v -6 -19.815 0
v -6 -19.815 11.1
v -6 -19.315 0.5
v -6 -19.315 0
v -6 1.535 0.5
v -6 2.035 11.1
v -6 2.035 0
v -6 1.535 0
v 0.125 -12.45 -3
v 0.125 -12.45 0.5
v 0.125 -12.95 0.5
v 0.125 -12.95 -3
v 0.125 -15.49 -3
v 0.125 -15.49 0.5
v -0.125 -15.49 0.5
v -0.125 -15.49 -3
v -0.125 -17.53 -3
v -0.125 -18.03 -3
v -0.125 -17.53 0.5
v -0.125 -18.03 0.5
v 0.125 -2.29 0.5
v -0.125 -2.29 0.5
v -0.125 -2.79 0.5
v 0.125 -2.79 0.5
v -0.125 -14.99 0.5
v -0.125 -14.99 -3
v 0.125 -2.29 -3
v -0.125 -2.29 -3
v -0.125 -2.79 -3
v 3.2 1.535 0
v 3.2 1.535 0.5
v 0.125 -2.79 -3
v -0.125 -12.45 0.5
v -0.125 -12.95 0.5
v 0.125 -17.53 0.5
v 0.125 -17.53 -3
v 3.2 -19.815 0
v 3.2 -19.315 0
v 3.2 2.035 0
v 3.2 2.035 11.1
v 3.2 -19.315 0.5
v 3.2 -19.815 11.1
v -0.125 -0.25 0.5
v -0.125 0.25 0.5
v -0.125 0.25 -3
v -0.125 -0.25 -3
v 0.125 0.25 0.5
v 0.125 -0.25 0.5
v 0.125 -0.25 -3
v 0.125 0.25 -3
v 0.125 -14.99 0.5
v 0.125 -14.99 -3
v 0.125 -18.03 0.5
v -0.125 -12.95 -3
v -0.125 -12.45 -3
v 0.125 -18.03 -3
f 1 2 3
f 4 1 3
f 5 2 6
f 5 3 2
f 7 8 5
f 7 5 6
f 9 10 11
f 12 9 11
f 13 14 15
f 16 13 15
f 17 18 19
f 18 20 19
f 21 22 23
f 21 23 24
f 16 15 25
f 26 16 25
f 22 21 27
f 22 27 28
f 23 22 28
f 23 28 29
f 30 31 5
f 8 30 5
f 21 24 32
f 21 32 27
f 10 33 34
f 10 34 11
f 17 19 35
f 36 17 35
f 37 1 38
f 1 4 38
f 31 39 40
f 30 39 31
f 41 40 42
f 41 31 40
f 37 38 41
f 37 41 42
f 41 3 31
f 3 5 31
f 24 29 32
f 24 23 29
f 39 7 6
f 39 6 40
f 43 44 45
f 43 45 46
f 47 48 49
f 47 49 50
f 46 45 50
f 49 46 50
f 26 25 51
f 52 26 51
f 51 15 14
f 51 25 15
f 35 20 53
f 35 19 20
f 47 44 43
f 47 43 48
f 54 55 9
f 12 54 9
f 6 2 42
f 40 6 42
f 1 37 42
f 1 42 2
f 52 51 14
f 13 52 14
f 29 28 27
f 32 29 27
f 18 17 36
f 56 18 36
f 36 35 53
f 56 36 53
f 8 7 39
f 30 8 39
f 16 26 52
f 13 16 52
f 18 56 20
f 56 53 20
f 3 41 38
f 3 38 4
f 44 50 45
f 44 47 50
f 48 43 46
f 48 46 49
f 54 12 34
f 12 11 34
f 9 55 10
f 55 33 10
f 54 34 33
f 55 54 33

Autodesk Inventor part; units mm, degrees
ref_plane "YZ Plane" through (0, 0, 0) normal (1, 0, 0) x (0, 1, 0)
ref_plane "XZ Plane" through (0, 0, 0) normal (0, 1, 0) x (-1, 0, 0)
ref_plane "XY Plane" through (0, 0, 0) normal (0, 0, 1) x (1, 0, 0)
sketch "Sketch2" plane through (0, 0, 0) normal (0, 0, 1) x (1, 0, 0)
  line L0 (-6, 2.035) -> (3.2, 2.035)
  line L1 (3.2, 2.035) -> (3.2, -19.815)
  line L2 (3.2, -19.815) -> (-6, -19.815)
  line L3 (-6, -19.815) -> (-6, 2.035)
  line L4 (-0.125, -0.25) -> (0.125, -0.25)
  line L5 (0.125, -0.25) -> (0.125, 0.25)
  line L6 (0.125, 0.25) -> (-0.125, 0.25)
  line L7 (-0.125, 0.25) -> (-0.125, -0.25)
  line L8 (-0.125, -0.25) -> (0.125, 0.25) construction
  line L9 (0.125, -0.25) -> (-0.125, 0.25) construction
  line L10 (-0.125, -2.79) -> (0.125, -2.79)
  line L11 (0.125, -2.79) -> (0.125, -2.29)
  line L12 (0.125, -2.29) -> (-0.125, -2.29)
  line L13 (-0.125, -2.29) -> (-0.125, -2.79)
  line L14 (-0.125, -2.79) -> (0.125, -2.29) construction
  line L15 (0.125, -2.79) -> (-0.125, -2.29) construction
  line L16 (-0.125, -12.45) -> (0.125, -12.45)
  line L17 (0.125, -12.45) -> (0.125, -12.95)
  line L18 (0.125, -12.95) -> (-0.125, -12.95)
  line L19 (-0.125, -12.95) -> (-0.125, -12.45)
  line L20 (-0.125, -12.45) -> (0.125, -12.95) construction
  line L21 (0.125, -12.45) -> (-0.125, -12.95) construction
  line L22 (-0.125, -14.99) -> (0.125, -14.99)
  line L23 (0.125, -14.99) -> (0.125, -15.49)
  line L24 (-0.125, -15.49) -> (-0.125, -14.99)
  line L25 (-0.125, -14.99) -> (0.125, -15.49) construction
  line L26 (0.125, -14.99) -> (-0.125, -15.49) construction
  line L27 (0.125, -15.49) -> (-0.125, -15.49)
  line L28 (-0.125, -17.53) -> (0.125, -17.53)
  line L29 (0.125, -17.53) -> (0.125, -18.03)
  line L30 (-0.125, -18.03) -> (-0.125, -17.53)
  line L31 (-0.125, -17.53) -> (0.125, -18.03) construction
  line L32 (0.125, -17.53) -> (-0.125, -18.03) construction
  line L33 (0.125, -18.03) -> (-0.125, -18.03)
  line L34 (-6, 2.035) -> (3.2, 2.035)
  line L35 (3.2, 2.035) -> (3.2, 1.535)
  line L36 (3.2, 1.535) -> (-6, 1.535)
  line L37 (-6, 1.535) -> (-6, 2.035)
  line L38 (-6, -19.815) -> (3.2, -19.815)
  line L39 (3.2, -19.815) -> (3.2, -19.315)
  line L40 (3.2, -19.315) -> (-6, -19.315)
  line L41 (-6, -19.315) -> (-6, -19.815)
  point P0 (0, 0)
  point P1 (0, -2.54)
  point P2 (0, -12.7)
  point P3 (0, -15.24)
  point P4 (0, -17.78)
  dimension "d37" = 2.035
  dimension "d38" = 3.2
  dimension "d40" = 9.2
  dimension "d41" = 0.25
  dimension "d42" = 0.5
  dimension "d45" = 2.54
  dimension "d50" = 0.25
  dimension "d51" = 0.5
  dimension "d52" = 0
  dimension "d53" = 12.7
  dimension "d56" = 2.54
  dimension "d61" = 0.5
  dimension "d62" = 0.5
  dimension "d72" = 21.85
extrude "Extrusion4" add sketch "Sketch2" along normal blind 10.6 contours L0 L1 L36 L3 | L36 L1 L40 L3 | L40 L1 L2 L3 | L7 L6 L5 L4 | L13 L12 L11 L10 | L16 L17 L18 L19 | L22 L23 L27 L24 | L28 L29 L33 L30
extrude "Extrusion5" add sketch "Sketch2" against normal blind 0.5 contours L0 L1 L36 L3 | L40 L1 L2 L3
extrude "Extrusion6" add sketch "Sketch2" against normal blind 3.5 separate body contours L7 L6 L5 L4 | L13 L12 L11 L10 | L16 L17 L18 L19 | L22 L23 L27 L24 | L28 L29 L33 L30
move or copy body "Move Body1" bodies to move or copy 1 2 copy no translate (0, 0, 0.5)
equation "\"d50\" = d41"
equation "\"d51\" = d42"
properties part number "Converter_DCDC_XP_POWER-ITXxxxxSA_SIP_THT"
